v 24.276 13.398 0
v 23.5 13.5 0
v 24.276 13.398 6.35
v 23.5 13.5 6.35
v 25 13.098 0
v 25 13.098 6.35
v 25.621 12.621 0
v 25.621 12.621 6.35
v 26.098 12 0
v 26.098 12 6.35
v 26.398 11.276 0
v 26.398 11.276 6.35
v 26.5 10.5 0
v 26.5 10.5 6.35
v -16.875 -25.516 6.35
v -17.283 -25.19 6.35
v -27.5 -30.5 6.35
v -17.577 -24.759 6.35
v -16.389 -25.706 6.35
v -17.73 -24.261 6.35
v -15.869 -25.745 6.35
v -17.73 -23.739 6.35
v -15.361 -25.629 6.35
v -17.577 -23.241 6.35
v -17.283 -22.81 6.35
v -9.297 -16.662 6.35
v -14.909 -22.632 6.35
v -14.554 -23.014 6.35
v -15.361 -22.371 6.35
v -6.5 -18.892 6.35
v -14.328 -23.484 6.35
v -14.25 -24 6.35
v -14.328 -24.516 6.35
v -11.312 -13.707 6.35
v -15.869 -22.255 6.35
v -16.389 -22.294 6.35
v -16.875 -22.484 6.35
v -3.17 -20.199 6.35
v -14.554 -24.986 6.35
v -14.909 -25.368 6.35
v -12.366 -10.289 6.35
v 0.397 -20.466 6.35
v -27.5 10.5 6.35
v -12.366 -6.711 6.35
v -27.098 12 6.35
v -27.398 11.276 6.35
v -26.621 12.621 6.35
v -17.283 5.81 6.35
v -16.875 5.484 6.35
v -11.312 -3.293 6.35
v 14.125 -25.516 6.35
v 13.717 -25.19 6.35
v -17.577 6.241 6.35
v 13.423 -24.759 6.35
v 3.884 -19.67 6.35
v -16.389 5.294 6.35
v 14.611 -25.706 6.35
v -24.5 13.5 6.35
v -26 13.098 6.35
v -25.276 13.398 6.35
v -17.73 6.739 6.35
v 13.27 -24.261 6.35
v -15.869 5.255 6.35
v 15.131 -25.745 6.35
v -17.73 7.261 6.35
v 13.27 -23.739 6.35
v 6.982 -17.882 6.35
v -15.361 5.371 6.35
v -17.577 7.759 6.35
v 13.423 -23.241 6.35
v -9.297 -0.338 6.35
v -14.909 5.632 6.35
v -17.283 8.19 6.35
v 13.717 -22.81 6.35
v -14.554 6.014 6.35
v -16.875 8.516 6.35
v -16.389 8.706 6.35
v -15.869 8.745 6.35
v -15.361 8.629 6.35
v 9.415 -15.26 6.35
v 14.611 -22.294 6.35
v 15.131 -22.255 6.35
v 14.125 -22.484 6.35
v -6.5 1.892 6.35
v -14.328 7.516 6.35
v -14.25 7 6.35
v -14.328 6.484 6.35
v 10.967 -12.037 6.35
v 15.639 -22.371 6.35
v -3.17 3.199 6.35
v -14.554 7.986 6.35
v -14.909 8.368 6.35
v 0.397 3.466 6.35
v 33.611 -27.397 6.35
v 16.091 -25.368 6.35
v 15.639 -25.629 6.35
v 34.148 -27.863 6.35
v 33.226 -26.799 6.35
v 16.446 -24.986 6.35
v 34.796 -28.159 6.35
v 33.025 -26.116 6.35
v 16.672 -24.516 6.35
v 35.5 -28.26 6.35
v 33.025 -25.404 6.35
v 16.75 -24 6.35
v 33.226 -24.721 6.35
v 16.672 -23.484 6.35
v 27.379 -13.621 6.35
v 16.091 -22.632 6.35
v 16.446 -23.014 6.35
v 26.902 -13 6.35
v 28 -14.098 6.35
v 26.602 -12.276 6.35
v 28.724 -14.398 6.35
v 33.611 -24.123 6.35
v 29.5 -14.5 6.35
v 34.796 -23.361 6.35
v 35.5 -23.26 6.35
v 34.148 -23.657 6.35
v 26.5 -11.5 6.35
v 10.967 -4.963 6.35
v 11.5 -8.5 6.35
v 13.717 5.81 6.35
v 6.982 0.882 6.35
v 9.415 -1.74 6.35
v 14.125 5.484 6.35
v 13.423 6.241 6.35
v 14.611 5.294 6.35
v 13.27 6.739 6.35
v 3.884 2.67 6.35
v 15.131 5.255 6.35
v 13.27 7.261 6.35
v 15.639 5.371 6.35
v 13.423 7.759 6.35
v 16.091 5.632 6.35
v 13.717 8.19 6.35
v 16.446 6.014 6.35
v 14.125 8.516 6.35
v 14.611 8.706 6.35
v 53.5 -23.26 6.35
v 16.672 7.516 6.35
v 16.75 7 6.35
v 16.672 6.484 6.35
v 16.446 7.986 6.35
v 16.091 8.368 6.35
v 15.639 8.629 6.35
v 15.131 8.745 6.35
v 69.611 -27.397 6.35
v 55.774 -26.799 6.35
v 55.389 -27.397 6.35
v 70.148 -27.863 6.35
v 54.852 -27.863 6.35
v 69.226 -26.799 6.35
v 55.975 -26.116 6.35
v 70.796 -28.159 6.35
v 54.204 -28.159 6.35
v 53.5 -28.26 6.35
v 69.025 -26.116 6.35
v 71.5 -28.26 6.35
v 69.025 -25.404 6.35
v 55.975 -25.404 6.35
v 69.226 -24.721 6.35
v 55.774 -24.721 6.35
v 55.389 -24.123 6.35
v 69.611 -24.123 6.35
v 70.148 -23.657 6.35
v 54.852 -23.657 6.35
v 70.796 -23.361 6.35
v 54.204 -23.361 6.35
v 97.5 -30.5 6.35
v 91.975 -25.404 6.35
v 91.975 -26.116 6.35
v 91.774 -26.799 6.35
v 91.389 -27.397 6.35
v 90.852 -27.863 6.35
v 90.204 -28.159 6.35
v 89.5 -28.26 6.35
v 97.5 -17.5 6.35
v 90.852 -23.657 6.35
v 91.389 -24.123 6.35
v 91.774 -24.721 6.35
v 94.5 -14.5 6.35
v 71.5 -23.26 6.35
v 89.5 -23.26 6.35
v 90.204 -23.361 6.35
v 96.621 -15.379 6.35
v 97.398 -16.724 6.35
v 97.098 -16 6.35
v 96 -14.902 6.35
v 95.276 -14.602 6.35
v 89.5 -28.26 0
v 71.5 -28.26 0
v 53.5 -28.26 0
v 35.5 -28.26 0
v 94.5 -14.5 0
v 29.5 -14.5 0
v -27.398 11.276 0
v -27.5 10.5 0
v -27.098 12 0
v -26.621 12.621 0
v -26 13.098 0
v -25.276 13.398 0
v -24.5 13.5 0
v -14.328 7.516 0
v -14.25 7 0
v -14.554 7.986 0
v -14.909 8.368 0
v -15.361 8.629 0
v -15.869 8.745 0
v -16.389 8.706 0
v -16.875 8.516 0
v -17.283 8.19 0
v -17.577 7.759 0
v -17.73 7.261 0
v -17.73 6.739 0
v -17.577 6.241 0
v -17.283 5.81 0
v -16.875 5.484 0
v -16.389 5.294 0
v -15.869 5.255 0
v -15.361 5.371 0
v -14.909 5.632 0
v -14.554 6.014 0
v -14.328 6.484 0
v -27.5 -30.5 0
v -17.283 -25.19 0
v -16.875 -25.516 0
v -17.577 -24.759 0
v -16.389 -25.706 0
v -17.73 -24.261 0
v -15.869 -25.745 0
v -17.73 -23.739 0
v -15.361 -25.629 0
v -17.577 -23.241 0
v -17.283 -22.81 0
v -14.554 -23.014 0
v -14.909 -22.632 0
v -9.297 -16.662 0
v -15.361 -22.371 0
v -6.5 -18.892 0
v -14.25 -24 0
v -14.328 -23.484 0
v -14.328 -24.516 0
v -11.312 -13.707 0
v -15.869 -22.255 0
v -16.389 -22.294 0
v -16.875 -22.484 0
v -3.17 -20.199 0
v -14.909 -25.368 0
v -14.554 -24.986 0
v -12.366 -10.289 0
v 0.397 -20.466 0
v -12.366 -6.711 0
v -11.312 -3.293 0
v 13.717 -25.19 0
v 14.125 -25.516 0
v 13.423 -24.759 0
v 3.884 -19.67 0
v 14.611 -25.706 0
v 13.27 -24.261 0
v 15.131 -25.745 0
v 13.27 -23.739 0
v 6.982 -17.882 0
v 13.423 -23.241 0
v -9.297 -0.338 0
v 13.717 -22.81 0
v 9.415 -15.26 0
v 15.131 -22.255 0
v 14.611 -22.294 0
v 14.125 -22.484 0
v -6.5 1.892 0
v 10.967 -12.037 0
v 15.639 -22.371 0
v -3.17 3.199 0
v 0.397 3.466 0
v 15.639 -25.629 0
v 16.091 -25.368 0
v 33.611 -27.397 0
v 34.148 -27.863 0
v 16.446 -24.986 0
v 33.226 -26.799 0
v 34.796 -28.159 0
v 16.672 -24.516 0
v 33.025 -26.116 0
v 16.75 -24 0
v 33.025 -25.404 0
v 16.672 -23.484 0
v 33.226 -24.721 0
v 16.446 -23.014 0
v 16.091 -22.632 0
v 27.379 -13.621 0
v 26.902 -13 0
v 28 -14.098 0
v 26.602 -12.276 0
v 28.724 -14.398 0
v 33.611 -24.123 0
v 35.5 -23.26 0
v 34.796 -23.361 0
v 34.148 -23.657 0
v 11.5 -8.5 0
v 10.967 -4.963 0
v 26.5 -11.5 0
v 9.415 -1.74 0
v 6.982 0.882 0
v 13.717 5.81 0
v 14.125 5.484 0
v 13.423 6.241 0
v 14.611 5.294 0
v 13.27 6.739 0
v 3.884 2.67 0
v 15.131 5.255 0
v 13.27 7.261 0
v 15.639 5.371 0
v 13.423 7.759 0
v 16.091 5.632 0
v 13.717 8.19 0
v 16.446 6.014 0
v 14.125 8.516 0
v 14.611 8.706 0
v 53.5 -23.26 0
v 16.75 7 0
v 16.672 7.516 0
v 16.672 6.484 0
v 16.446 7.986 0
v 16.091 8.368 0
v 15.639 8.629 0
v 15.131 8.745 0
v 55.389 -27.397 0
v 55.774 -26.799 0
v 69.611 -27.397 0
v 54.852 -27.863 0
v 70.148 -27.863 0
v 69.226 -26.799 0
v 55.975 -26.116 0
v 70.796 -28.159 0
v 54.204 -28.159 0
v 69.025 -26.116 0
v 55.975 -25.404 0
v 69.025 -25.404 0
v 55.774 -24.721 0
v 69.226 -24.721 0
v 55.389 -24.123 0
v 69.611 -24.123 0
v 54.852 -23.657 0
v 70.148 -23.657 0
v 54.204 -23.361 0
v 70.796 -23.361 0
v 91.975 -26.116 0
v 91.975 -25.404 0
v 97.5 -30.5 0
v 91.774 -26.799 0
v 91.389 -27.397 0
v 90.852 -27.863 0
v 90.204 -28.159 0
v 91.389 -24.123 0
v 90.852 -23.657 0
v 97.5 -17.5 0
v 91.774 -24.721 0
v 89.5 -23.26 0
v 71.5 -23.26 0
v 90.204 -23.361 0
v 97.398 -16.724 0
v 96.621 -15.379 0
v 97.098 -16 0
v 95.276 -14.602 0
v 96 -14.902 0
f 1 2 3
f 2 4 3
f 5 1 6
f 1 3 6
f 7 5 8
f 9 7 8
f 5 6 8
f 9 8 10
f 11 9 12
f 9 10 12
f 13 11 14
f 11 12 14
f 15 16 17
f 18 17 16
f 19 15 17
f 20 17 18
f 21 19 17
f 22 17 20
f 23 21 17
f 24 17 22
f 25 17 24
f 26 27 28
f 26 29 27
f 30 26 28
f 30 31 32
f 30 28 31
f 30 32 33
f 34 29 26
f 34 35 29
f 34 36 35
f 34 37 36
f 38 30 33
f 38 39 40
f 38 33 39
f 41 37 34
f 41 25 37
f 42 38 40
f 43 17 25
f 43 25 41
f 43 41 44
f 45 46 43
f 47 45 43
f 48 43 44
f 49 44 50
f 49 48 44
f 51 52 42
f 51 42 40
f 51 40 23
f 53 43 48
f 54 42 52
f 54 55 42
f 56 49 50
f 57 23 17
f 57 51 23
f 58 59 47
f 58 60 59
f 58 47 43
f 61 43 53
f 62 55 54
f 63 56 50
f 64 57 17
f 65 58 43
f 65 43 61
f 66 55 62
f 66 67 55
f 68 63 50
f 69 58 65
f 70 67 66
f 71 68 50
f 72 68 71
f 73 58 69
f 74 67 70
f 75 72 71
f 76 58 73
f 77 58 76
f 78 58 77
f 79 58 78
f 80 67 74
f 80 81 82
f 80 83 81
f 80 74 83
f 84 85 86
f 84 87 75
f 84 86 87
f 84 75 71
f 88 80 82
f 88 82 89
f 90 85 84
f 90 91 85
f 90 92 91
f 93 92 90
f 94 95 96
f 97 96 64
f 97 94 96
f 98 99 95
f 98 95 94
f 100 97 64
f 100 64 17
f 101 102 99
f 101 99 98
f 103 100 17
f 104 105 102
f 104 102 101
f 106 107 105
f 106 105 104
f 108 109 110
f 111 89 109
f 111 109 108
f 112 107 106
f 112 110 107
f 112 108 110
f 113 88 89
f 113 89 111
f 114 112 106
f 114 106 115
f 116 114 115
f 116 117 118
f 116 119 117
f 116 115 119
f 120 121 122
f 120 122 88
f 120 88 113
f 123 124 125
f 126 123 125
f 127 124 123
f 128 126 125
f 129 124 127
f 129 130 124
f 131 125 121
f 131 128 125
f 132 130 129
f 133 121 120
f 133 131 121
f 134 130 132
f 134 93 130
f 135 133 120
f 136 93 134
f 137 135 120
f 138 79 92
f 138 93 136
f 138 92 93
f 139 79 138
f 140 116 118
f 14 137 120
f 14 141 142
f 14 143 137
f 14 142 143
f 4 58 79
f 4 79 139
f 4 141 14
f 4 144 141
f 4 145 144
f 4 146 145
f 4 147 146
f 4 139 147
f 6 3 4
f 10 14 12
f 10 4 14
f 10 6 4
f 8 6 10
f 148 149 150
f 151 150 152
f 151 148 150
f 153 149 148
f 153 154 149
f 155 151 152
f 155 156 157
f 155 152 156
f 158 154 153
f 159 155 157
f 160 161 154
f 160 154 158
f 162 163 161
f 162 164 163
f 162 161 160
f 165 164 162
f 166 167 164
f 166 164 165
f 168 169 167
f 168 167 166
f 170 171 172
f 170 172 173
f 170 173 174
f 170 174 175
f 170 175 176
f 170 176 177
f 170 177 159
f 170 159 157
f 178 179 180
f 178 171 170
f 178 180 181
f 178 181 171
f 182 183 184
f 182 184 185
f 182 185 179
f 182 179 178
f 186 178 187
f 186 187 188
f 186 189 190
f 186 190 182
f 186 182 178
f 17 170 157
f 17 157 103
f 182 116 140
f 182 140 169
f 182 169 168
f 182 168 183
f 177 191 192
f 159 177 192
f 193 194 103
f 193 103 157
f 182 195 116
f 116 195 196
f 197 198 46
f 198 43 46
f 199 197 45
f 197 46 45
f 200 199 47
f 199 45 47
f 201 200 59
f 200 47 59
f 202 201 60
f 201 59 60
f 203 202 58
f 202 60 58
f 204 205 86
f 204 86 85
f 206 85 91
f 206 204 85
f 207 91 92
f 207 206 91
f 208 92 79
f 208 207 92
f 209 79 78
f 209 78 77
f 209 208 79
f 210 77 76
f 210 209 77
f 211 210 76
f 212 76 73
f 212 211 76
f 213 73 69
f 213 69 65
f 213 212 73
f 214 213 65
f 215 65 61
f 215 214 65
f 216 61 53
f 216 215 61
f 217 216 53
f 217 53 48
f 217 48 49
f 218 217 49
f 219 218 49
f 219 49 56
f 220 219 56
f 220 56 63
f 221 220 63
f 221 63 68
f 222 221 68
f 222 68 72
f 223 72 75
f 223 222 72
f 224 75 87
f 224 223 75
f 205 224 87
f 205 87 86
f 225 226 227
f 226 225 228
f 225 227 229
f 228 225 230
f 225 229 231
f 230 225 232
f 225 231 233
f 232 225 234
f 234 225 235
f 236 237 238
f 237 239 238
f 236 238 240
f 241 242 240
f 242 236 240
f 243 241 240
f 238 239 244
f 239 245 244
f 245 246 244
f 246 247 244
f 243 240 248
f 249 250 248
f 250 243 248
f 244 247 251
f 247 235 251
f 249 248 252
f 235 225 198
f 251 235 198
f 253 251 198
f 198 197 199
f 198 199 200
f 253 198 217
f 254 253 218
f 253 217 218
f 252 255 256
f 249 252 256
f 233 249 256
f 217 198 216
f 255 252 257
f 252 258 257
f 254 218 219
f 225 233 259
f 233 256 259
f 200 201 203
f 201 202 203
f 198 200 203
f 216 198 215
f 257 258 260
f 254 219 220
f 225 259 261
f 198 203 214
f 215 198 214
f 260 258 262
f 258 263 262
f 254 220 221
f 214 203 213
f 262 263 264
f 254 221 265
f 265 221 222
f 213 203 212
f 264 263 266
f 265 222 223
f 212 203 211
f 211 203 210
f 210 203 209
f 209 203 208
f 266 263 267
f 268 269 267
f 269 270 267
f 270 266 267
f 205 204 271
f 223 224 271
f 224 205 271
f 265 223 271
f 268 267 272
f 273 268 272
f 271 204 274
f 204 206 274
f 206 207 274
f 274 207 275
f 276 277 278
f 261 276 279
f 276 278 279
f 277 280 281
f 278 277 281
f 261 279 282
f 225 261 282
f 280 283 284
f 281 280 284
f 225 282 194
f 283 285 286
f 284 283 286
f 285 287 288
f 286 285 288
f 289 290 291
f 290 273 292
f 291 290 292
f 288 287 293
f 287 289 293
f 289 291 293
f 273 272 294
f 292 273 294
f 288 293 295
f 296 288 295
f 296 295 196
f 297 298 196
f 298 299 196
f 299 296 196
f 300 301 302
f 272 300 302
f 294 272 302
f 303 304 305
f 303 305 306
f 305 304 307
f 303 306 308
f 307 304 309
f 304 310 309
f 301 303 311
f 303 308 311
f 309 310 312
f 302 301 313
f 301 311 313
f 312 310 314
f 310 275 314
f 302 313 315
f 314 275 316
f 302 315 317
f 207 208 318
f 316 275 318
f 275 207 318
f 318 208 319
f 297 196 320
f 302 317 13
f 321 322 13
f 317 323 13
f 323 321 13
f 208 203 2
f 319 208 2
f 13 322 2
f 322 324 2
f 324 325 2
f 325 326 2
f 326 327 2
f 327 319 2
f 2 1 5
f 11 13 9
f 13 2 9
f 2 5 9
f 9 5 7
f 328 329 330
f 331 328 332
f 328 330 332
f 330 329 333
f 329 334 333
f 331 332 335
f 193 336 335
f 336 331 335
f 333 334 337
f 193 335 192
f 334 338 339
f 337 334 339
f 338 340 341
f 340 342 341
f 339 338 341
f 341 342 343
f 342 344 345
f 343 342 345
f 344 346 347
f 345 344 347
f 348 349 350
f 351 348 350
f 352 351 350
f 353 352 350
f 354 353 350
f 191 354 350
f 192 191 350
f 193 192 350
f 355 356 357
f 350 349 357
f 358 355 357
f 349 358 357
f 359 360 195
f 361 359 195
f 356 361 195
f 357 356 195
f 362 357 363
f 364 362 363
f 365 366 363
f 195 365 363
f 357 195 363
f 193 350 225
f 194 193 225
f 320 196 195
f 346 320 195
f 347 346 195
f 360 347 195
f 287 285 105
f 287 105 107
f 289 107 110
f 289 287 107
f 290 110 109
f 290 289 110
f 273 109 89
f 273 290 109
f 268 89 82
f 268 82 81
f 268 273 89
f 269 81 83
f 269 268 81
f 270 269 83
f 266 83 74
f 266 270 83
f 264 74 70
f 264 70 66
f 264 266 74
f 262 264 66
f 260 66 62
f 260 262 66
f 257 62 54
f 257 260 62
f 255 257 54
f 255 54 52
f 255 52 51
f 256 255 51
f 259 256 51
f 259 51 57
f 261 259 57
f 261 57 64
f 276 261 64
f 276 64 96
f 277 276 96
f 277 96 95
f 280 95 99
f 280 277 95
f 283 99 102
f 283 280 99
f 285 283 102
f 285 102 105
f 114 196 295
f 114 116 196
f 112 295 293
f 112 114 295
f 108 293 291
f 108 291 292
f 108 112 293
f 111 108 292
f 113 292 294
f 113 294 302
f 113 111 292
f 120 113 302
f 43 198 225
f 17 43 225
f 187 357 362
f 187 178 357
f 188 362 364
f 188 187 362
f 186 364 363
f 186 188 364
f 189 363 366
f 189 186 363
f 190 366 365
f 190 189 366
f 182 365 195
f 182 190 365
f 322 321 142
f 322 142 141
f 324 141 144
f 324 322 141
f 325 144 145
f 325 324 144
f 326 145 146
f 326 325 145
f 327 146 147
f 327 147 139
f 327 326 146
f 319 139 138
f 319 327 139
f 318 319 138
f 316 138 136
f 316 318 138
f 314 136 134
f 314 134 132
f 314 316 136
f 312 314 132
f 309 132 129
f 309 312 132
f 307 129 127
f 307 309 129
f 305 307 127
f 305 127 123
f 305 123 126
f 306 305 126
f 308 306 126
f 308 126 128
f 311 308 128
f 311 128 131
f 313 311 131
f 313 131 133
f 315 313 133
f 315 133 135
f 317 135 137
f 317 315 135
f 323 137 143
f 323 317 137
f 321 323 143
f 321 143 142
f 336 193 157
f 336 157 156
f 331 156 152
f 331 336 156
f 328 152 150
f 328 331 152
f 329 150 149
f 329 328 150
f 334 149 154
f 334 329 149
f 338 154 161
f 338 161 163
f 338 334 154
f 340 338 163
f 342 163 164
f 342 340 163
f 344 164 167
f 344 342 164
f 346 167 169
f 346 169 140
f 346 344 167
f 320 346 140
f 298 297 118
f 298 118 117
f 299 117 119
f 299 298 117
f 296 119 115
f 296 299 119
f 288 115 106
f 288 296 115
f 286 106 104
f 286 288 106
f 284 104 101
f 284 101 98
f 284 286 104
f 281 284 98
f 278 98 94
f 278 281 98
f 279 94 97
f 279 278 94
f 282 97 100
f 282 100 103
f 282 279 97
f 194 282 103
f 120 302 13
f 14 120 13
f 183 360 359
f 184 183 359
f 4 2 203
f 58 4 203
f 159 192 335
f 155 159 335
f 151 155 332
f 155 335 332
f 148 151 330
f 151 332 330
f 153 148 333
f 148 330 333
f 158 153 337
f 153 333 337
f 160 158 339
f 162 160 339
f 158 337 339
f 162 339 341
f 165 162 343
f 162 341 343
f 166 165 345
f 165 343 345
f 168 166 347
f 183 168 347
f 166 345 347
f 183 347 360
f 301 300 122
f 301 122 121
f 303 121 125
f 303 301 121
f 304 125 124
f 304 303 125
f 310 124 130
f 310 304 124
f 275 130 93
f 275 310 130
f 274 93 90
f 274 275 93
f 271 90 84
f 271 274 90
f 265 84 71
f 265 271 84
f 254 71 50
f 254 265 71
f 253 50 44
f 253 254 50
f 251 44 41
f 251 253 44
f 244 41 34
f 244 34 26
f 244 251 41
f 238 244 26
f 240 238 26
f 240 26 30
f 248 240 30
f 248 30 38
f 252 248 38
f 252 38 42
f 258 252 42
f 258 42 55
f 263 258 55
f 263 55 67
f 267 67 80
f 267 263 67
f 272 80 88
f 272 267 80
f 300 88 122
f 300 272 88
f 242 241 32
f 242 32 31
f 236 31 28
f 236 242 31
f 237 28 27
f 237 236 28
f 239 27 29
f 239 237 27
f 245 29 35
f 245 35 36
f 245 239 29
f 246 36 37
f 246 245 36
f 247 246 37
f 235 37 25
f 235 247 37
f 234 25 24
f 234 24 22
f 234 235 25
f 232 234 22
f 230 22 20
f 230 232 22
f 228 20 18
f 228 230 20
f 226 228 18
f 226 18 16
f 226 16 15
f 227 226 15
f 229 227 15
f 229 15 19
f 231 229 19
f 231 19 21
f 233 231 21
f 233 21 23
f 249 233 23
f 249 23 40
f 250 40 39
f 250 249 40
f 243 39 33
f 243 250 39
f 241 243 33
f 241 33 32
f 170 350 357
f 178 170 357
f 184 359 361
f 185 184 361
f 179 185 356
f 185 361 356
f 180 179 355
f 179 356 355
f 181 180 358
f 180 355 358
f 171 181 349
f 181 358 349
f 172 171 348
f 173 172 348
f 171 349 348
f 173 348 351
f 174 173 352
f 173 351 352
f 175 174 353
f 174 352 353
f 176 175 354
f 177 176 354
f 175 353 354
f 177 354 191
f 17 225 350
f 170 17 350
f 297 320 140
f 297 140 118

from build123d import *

# Parameters (mm, degrees)
CROQUIS2_R              = 1.75
CROQUIS2_R_2            = 12
SALIENTE_EXTRUIR1_DEPTH = 6.35
REDONDEO1_R             = 3


with BuildPart() as part:
    # Croquis2 → Saliente-Extruir1 (new body)
    with BuildSketch(Plane.XY):
        Polygon((-27.5, -30.5), (97.5, -30.5), (97.5, -14.5), (26.5, -14.5), (26.5, 13.5), (-27.5, 13.5), align=None)
        with Locations((-16, 7)):
            Circle(CROQUIS2_R, mode=Mode.SUBTRACT)
        with Locations((15, 7)):
            Circle(CROQUIS2_R, mode=Mode.SUBTRACT)
        with Locations((15, -24)):
            Circle(CROQUIS2_R, mode=Mode.SUBTRACT)
        with Locations((-16, -24)):
            Circle(CROQUIS2_R, mode=Mode.SUBTRACT)
        with Locations((-0.5, -8.5)):
            Circle(CROQUIS2_R_2, mode=Mode.SUBTRACT)
        with BuildLine():
            Line((71.5, -23.26), (89.5, -23.26))
            ThreePointArc((89.5, -23.26), (92, -25.76), (89.5, -28.26))
            Line((89.5, -28.26), (71.5, -28.26))
            ThreePointArc((71.5, -28.26), (69, -25.76), (71.5, -23.26))
        make_face(mode=Mode.SUBTRACT)
        with BuildLine():
            Line((53.5, -23.26), (35.5, -23.26))
            ThreePointArc((35.5, -23.26), (33, -25.76), (35.5, -28.26))
            Line((35.5, -28.26), (53.5, -28.26))
            ThreePointArc((53.5, -28.26), (56, -25.76), (53.5, -23.26))
        make_face(mode=Mode.SUBTRACT)
    extrude(amount=SALIENTE_EXTRUIR1_DEPTH)

    # Redondeo1
    redondeo1_edges = [part.edges().sort_by_distance(p)[0] for p in [
        (-27.5, 13.5, 3.175),
        (26.5, 13.5, 3.175),
        (26.5, -14.5, 3.175),
        (97.5, -14.5, 3.175),
    ]]
    fillet(redondeo1_edges, radius=REDONDEO1_R)


solid = part.part
